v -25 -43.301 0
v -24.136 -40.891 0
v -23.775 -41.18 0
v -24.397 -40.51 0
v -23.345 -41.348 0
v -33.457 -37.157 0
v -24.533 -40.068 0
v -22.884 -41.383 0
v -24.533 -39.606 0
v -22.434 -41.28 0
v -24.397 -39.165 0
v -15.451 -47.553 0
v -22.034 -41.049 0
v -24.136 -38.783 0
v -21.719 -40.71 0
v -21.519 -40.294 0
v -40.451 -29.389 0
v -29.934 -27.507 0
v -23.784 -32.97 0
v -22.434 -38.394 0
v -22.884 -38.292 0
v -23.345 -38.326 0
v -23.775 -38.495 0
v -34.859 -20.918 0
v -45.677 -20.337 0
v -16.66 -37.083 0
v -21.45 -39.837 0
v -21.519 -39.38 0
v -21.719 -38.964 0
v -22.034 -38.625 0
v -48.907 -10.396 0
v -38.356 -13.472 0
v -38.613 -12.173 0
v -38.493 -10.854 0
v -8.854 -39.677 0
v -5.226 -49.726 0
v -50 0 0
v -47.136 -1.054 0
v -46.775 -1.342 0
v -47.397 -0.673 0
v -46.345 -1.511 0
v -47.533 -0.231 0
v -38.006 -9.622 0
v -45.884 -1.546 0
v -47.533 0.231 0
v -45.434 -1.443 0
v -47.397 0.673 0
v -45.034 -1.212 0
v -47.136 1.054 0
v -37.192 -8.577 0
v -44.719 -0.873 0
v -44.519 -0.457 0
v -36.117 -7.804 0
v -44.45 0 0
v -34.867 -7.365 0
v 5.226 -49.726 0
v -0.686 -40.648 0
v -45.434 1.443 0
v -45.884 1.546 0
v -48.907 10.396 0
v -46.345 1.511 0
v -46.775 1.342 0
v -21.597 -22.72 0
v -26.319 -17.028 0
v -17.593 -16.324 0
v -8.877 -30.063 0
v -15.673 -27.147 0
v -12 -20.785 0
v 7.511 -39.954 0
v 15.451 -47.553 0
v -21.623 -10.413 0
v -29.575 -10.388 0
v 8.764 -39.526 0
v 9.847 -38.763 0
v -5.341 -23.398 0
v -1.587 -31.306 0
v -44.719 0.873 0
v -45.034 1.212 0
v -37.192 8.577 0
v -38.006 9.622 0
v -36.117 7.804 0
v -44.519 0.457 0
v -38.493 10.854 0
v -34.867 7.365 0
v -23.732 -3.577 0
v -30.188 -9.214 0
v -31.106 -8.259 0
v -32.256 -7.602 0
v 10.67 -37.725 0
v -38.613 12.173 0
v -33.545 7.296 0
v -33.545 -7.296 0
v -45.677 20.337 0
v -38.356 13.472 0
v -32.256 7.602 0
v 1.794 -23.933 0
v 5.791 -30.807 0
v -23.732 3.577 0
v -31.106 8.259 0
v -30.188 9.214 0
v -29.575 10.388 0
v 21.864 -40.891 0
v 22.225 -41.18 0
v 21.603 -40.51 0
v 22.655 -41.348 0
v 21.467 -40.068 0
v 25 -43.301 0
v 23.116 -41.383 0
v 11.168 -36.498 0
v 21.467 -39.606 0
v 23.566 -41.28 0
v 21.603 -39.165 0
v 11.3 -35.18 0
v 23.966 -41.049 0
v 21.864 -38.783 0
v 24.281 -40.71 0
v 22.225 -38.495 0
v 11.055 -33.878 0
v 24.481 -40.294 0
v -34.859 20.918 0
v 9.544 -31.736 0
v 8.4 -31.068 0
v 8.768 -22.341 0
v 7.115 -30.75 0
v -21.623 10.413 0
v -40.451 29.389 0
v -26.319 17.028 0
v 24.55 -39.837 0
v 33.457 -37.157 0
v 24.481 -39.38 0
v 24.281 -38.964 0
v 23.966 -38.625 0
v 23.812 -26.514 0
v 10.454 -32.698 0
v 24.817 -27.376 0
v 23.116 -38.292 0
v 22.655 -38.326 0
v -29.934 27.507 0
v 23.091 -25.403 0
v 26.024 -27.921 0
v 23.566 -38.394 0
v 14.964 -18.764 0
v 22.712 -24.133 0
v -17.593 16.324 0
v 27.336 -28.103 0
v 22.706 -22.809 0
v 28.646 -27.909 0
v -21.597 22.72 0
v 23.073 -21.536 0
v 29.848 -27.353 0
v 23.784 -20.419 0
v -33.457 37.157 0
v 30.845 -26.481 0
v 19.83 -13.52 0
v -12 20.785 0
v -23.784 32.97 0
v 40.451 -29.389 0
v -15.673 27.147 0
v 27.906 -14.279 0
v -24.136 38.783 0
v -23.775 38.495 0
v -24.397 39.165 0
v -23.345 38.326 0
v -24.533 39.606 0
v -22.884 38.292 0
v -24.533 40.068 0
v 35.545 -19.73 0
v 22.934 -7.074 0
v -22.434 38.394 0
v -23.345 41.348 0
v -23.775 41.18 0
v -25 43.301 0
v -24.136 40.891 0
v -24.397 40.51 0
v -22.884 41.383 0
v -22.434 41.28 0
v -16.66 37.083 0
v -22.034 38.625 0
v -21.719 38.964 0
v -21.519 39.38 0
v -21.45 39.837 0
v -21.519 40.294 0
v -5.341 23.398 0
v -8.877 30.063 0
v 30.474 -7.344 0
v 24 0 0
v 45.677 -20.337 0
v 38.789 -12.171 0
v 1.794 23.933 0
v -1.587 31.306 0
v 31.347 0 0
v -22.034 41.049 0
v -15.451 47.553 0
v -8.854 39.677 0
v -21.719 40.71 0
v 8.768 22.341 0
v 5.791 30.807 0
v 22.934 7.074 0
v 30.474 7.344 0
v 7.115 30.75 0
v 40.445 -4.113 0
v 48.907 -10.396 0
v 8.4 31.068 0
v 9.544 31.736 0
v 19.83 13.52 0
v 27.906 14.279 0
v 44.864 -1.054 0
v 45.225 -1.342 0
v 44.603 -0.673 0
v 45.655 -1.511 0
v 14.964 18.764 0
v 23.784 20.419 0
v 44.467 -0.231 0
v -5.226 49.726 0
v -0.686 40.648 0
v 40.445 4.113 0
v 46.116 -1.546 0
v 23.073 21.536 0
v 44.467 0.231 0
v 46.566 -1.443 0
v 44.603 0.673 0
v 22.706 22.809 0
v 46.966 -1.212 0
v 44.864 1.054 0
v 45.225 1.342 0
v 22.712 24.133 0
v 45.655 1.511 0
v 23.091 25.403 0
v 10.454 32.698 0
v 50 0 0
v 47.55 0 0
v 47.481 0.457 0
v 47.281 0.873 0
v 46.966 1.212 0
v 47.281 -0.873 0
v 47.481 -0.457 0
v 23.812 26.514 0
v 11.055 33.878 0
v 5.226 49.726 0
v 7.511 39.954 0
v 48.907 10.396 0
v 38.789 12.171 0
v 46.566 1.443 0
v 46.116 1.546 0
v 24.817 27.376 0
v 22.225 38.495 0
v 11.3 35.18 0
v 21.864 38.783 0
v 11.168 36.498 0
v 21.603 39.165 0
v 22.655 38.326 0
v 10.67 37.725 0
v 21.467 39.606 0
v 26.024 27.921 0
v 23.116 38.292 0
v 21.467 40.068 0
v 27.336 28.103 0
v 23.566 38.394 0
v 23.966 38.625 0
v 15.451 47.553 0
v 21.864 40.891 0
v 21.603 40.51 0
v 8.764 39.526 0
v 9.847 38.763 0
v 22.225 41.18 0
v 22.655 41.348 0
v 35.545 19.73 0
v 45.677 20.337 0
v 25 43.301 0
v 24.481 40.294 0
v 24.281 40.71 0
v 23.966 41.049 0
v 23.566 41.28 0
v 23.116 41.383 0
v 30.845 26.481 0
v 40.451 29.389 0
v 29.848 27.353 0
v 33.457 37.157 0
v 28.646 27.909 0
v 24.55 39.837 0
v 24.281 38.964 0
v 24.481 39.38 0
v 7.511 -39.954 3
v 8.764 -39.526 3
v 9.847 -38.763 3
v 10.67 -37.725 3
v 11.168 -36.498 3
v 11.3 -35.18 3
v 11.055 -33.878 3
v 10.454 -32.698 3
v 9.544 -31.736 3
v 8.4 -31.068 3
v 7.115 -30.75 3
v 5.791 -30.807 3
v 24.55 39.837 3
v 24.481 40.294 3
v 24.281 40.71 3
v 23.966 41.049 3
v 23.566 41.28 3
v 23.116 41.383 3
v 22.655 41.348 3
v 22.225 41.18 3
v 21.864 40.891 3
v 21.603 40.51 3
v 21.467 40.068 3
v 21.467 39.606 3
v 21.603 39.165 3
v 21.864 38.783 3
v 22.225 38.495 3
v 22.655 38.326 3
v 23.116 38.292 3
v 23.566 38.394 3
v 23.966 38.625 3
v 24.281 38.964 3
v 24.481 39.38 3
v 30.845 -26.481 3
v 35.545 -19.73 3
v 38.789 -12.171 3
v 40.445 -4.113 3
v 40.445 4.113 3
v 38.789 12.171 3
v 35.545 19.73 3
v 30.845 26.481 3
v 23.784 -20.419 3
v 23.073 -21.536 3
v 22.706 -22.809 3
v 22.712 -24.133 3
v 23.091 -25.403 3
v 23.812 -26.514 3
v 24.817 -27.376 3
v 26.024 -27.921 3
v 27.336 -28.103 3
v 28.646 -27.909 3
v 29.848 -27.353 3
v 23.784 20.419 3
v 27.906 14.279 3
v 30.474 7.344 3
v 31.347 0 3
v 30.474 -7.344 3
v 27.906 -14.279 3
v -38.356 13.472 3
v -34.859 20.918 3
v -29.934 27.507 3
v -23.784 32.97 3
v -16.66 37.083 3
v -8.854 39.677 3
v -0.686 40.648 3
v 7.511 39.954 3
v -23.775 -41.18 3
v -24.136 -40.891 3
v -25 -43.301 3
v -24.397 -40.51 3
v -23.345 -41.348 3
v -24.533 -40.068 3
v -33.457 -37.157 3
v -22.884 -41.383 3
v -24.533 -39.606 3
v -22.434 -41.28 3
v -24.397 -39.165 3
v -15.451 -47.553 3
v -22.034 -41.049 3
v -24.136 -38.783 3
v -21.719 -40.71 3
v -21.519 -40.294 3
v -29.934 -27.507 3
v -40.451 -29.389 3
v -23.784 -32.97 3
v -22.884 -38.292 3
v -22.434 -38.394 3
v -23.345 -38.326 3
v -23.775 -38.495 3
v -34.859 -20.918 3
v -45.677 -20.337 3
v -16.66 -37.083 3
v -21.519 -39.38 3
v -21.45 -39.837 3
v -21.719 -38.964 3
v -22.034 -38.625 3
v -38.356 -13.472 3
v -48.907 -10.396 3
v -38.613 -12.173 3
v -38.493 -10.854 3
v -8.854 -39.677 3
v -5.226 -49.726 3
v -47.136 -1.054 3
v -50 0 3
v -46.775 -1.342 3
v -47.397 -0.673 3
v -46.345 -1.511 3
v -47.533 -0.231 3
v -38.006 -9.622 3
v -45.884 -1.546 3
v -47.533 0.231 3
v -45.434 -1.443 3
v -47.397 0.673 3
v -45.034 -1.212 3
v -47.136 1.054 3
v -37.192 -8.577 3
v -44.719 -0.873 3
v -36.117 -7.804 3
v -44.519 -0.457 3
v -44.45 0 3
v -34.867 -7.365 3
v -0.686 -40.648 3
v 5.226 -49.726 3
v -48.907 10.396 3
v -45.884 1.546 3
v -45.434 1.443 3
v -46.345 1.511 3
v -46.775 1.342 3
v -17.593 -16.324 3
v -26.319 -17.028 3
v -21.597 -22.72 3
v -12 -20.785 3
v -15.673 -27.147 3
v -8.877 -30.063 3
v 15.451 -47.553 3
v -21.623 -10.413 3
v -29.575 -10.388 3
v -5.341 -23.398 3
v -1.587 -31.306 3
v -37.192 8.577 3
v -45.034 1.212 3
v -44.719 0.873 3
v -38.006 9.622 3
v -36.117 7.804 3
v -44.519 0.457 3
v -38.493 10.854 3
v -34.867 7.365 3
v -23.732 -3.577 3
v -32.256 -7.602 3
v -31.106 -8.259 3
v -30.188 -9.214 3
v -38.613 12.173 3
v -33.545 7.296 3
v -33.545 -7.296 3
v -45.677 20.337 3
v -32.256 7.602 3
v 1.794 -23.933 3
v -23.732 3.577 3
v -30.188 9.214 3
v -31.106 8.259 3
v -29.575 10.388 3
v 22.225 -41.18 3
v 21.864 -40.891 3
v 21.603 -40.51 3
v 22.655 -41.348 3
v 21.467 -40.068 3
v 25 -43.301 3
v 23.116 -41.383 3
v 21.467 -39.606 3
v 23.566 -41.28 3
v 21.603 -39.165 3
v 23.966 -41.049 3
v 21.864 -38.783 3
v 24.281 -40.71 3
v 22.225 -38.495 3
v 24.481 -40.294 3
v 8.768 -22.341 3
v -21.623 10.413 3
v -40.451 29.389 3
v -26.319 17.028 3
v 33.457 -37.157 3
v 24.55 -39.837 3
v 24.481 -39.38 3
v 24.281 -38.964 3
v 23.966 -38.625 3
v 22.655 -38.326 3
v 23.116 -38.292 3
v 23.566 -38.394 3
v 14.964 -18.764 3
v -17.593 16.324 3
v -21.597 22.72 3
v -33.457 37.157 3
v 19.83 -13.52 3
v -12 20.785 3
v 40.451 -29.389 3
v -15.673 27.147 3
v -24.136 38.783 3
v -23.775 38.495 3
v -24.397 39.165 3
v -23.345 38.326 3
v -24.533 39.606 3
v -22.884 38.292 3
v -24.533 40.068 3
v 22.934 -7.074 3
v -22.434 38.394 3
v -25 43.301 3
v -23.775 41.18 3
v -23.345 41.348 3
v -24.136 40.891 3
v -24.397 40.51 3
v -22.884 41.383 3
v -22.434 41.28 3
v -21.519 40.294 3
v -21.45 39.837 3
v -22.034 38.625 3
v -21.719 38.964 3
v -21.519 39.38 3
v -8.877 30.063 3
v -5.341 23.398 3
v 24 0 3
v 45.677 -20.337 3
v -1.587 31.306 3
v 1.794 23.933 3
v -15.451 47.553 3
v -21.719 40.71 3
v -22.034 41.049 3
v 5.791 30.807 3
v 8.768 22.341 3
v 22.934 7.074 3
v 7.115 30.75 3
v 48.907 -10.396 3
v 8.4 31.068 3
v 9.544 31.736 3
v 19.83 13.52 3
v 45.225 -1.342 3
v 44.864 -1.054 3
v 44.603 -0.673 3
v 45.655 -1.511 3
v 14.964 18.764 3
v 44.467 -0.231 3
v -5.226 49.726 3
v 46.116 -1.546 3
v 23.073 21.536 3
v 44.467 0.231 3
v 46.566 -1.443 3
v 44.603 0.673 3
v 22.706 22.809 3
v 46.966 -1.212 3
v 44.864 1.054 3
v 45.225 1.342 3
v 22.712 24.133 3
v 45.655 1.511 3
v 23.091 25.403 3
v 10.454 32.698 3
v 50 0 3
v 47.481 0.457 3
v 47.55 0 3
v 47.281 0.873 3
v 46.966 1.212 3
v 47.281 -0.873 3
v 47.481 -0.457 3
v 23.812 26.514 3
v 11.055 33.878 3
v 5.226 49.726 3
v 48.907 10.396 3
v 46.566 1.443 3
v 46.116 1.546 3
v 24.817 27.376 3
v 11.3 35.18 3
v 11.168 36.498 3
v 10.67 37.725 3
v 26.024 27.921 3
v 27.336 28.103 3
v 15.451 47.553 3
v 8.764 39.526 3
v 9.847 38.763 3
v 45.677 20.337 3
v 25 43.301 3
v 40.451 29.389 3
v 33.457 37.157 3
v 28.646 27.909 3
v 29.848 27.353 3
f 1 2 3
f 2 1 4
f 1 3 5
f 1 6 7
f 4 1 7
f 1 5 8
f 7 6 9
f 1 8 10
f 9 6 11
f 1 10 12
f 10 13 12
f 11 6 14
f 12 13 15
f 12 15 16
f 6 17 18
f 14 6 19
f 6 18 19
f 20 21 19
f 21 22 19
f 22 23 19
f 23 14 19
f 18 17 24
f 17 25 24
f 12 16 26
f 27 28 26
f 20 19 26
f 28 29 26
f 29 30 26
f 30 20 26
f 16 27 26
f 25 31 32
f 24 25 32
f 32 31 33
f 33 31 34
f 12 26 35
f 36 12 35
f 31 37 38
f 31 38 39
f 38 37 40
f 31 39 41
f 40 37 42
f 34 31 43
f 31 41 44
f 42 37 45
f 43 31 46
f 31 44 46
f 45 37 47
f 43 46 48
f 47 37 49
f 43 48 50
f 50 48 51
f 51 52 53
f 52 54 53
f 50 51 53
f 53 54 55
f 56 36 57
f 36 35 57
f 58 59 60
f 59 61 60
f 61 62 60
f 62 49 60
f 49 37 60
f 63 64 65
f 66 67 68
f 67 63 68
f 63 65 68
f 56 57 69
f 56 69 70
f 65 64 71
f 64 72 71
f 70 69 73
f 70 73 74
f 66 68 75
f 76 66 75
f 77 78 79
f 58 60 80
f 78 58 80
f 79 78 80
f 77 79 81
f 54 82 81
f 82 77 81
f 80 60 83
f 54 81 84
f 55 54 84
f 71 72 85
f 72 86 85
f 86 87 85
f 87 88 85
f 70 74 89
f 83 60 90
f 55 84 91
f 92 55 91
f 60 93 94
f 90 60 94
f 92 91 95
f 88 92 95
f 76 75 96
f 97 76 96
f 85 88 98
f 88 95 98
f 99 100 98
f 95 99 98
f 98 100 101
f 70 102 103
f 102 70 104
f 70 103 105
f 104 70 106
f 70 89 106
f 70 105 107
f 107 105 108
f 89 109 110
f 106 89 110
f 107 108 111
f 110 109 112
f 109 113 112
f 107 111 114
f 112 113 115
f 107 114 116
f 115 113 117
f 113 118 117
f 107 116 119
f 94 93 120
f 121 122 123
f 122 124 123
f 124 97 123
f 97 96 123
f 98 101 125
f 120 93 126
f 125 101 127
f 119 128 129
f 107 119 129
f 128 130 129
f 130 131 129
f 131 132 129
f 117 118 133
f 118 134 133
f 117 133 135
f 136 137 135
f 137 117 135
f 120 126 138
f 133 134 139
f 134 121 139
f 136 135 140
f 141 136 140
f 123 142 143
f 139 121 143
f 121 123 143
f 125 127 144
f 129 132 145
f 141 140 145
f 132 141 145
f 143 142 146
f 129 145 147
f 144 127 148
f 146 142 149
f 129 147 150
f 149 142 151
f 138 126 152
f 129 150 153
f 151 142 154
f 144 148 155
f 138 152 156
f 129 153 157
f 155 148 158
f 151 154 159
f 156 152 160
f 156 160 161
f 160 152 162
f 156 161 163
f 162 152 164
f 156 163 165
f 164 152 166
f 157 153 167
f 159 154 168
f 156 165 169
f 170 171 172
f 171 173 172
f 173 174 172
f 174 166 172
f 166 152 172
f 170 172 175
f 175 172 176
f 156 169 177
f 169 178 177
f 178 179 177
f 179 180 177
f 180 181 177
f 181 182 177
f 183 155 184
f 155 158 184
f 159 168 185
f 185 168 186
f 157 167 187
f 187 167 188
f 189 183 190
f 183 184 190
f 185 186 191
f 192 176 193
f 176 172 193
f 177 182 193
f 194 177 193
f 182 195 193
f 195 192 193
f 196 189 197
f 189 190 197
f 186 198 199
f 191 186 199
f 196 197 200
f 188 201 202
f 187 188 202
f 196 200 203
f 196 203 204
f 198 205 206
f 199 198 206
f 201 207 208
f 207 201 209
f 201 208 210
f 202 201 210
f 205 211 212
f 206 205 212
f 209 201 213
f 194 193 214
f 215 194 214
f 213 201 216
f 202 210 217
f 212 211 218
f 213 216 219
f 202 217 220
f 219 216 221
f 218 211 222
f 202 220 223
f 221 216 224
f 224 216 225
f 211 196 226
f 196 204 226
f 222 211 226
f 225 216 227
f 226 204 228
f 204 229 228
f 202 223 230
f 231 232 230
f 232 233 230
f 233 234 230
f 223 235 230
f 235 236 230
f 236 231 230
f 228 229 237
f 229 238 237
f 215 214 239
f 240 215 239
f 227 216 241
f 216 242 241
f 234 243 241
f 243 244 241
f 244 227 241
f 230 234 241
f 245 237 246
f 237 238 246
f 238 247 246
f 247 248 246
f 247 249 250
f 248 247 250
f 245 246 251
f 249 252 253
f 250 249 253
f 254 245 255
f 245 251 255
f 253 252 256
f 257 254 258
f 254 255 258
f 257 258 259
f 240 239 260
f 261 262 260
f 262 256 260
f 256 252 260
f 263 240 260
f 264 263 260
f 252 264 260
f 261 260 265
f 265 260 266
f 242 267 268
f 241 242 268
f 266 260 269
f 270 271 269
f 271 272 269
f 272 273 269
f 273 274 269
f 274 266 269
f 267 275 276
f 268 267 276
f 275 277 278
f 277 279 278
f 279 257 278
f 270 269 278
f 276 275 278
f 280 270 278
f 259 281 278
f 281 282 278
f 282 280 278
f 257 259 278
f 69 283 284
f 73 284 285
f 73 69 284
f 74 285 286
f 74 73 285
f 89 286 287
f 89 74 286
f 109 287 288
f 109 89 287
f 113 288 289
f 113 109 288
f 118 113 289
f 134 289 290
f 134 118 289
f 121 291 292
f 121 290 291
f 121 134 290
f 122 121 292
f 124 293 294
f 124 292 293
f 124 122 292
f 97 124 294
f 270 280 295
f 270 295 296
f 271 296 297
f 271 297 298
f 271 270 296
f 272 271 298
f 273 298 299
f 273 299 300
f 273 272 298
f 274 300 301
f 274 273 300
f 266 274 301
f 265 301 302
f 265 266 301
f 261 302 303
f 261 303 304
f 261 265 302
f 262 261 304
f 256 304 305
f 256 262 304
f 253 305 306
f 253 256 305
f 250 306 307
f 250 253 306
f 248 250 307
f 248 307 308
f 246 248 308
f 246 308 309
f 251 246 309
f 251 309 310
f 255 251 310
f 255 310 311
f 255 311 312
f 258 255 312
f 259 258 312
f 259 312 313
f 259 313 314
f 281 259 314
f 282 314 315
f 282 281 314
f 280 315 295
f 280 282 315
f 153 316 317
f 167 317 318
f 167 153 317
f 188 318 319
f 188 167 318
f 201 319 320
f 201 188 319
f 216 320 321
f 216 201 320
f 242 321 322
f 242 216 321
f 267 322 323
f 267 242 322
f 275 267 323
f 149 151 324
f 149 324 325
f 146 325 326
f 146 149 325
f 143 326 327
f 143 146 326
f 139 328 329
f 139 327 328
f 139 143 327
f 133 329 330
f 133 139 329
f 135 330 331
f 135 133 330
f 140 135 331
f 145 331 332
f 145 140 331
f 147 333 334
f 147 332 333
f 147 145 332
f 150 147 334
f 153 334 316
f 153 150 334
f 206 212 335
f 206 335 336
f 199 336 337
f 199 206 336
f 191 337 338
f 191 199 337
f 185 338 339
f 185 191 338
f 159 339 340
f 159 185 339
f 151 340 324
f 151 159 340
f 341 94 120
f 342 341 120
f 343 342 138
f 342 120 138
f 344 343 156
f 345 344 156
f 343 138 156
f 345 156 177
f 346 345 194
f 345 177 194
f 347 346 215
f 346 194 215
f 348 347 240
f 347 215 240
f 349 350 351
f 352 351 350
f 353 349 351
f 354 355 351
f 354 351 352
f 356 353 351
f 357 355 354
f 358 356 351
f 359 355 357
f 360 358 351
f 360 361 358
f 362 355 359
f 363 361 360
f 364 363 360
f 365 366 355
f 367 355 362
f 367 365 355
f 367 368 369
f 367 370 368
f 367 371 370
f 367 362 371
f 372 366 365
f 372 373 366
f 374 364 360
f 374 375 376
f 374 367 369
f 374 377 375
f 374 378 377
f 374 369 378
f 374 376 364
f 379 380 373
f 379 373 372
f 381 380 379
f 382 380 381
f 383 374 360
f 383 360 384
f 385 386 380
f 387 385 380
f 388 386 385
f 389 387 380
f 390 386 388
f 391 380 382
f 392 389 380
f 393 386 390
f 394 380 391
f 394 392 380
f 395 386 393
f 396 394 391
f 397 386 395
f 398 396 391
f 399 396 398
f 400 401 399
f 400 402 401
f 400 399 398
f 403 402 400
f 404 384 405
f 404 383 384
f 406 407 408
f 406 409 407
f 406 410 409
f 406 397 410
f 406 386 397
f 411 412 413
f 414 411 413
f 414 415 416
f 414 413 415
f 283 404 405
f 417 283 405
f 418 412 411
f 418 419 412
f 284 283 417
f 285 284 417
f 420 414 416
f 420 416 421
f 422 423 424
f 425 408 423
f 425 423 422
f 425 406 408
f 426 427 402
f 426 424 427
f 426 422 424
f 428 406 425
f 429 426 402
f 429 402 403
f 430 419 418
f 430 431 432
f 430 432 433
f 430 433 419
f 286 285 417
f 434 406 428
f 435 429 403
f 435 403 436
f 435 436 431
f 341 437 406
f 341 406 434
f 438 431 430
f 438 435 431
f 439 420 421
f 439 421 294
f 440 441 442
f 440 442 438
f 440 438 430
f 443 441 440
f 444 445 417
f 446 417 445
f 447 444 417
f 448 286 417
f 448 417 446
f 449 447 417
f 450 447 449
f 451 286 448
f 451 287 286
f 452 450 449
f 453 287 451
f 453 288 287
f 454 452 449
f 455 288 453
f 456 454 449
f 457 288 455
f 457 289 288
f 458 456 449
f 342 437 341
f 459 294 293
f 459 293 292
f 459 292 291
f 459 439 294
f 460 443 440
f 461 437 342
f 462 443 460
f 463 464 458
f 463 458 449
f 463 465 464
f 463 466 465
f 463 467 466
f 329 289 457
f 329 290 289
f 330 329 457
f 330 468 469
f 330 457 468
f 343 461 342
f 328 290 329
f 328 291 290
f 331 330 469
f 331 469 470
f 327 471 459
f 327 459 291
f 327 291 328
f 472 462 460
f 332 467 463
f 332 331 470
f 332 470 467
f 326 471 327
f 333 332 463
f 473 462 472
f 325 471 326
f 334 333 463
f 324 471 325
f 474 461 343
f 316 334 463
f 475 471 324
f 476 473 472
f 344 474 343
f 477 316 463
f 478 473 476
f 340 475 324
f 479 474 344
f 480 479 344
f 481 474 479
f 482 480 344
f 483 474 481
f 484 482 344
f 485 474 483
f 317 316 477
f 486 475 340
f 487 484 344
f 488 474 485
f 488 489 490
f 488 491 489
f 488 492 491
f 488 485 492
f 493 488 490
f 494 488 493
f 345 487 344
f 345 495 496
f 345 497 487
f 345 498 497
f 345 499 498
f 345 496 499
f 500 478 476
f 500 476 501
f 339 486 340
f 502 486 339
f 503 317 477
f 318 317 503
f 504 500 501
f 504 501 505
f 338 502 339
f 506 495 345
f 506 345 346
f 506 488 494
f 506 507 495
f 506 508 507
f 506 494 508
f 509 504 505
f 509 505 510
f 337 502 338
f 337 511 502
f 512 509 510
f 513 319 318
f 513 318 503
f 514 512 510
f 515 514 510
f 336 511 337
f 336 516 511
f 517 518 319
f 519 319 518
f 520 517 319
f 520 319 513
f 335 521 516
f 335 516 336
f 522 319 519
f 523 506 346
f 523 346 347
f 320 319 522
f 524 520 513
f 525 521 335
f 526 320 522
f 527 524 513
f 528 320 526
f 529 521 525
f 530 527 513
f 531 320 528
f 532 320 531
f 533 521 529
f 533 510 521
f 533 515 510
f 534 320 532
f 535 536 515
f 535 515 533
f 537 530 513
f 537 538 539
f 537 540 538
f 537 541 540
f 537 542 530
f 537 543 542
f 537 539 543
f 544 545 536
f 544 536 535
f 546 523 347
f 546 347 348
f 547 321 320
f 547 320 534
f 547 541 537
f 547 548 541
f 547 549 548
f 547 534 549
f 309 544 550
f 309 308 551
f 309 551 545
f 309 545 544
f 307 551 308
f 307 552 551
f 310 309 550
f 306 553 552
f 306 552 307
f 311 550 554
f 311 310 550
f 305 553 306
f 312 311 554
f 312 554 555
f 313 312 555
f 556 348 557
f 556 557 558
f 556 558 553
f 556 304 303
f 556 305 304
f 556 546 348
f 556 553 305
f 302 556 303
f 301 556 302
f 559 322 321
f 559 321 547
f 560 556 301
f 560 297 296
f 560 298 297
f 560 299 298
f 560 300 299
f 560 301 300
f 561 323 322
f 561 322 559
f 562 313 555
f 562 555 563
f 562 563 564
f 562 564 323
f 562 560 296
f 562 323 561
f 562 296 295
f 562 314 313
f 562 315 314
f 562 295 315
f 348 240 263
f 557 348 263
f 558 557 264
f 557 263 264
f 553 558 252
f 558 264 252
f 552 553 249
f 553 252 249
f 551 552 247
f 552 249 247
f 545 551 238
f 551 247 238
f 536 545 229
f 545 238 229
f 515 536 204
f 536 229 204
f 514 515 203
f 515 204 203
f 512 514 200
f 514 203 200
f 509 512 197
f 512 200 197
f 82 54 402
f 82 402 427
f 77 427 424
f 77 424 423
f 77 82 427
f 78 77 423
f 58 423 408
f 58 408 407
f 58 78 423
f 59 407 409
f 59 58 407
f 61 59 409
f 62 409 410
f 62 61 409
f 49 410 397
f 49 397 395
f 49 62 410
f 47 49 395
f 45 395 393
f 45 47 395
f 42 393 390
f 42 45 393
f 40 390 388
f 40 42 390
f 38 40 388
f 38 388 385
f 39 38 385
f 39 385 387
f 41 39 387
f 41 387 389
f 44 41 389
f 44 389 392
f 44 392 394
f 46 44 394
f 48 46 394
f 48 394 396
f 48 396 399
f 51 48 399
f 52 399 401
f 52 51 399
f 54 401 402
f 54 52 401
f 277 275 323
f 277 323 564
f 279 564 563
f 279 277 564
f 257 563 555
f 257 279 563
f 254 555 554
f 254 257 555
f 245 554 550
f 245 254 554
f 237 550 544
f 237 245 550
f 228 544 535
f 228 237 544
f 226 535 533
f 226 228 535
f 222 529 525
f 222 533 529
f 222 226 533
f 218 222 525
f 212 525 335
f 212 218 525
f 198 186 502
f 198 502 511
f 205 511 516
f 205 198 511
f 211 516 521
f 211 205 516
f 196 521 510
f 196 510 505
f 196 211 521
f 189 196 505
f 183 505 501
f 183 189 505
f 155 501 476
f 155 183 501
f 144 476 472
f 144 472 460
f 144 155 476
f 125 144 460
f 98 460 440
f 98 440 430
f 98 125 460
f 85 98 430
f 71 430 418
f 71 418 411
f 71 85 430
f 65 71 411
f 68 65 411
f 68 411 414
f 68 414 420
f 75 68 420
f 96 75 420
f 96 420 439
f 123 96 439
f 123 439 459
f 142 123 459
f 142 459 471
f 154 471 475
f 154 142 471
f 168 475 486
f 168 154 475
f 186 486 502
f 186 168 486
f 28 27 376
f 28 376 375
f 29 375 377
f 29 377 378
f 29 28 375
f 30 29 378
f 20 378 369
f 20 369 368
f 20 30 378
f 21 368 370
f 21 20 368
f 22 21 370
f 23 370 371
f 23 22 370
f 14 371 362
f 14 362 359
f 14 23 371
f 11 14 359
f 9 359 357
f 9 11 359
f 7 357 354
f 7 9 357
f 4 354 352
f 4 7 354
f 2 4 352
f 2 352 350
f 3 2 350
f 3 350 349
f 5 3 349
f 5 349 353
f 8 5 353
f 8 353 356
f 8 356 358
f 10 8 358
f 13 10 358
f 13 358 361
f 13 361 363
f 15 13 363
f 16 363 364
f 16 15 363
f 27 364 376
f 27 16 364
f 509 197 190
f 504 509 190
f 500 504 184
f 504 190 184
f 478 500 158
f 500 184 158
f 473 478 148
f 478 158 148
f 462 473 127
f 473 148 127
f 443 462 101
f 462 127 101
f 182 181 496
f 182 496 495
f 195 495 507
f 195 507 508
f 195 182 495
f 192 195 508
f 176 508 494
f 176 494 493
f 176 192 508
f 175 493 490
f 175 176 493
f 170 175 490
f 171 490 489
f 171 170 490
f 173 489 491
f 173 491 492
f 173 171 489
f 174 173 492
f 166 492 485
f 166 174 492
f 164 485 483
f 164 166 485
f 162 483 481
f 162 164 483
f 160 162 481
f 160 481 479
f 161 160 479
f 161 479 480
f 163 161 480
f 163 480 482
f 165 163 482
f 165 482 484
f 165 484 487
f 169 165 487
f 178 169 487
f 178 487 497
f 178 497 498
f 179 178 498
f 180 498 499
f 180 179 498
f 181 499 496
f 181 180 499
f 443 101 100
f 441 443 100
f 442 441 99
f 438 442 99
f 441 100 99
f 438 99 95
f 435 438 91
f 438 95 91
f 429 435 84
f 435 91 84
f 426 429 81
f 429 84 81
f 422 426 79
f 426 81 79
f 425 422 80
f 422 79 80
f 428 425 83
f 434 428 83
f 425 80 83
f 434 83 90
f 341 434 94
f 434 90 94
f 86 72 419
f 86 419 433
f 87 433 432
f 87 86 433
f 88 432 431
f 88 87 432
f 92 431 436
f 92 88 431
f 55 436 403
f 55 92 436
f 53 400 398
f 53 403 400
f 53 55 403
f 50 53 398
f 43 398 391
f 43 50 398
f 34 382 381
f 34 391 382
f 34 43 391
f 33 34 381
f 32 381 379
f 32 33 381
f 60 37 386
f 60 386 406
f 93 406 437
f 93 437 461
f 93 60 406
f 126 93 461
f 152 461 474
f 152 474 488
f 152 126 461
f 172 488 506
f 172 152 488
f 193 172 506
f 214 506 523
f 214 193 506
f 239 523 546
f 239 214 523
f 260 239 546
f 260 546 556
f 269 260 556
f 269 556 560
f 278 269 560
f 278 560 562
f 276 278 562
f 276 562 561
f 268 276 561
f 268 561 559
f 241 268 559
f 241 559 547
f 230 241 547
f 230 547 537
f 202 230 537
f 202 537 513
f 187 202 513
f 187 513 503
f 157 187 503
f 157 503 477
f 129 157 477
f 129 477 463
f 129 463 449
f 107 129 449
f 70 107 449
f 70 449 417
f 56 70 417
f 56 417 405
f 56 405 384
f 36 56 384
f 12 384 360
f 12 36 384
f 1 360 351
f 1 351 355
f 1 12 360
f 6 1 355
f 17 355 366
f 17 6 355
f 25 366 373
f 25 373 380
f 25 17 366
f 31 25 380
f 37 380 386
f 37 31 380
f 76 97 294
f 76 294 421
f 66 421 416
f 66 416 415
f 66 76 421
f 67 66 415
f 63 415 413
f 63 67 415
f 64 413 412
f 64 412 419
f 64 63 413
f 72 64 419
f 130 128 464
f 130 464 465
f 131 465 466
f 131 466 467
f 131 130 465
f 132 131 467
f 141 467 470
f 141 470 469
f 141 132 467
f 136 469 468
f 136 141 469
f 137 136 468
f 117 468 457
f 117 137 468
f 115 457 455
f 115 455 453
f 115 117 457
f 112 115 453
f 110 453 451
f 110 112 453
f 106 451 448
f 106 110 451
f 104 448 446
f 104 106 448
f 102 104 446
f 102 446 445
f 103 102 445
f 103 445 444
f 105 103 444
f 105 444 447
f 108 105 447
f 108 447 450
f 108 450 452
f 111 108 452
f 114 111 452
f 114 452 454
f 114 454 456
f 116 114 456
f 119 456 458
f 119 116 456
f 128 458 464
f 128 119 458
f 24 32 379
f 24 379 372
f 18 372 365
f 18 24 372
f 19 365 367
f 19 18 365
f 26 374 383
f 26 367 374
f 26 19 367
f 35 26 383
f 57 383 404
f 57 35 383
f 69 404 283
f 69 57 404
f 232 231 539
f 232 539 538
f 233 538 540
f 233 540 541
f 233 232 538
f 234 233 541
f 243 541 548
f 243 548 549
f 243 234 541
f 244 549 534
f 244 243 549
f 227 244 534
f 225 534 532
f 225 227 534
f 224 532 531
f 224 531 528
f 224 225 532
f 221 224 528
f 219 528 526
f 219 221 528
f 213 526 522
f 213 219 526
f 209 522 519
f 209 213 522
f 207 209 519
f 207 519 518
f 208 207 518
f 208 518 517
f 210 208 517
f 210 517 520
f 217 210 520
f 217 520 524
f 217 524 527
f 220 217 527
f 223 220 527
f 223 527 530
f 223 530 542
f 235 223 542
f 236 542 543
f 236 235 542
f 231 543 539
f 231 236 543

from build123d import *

# Parameters (mm, degrees)
SKETCH_1_R          = 52
SKETCH_1_R_2        = 1.55
SKETCH_1_R_3        = 40
EXTRUDE_1_DEPTH     = 3
EXTRUDE_START       = -3
SKETCH_2_R          = 40
SKETCH_2_R_2        = 24
EXTRUDE_2_DEPTH     = 3
CUT_EXTRUDE_1_DEPTH = 10
SKETCH_5_R          = 63.024090269
SKETCH_5_R_2        = 50
CUT_EXTRUDE_2_DEPTH = 10


with BuildPart() as part:
    # 草图1 → 凸台-拉伸1 (new body)
    with BuildSketch(Plane.XY):
        Circle(SKETCH_1_R)
        with Locations((46, 0)):
            Circle(SKETCH_1_R_2, mode=Mode.SUBTRACT)
        with Locations((23, -39.837168574)):
            Circle(SKETCH_1_R_2, mode=Mode.SUBTRACT)
        with Locations((-23, -39.837168574)):
            Circle(SKETCH_1_R_2, mode=Mode.SUBTRACT)
        with Locations((-46, 0)):
            Circle(SKETCH_1_R_2, mode=Mode.SUBTRACT)
        with Locations((-23, 39.837168574)):
            Circle(SKETCH_1_R_2, mode=Mode.SUBTRACT)
        with Locations((23, 39.837168574)):
            Circle(SKETCH_1_R_2, mode=Mode.SUBTRACT)
        Circle(SKETCH_1_R_3, mode=Mode.SUBTRACT)
    extrude(amount=EXTRUDE_1_DEPTH)

    # 草图2 → 凸台-拉伸2 (add)
    with BuildSketch(Plane.XY.offset(3).offset(EXTRUDE_START)):
        Circle(SKETCH_2_R)
        Circle(SKETCH_2_R_2, mode=Mode.SUBTRACT)
    extrude(amount=EXTRUDE_2_DEPTH)

    # 草图4 → 切除-拉伸1 (cut)
    with BuildSketch(Plane(origin=(0, 0, 0), x_dir=(-1, 0, 0), z_dir=(0, 0, -1))):
        with BuildLine():
            ThreePointArc((38.356187762, 13.472205401), (20.326690938, 35.206861455), (-7.510821758, 39.953535695))
            ThreePointArc((-7.510821758, 39.953535695), (-11.224371039, 34.520536752), (-5.791372097, 30.806987471))
            ThreePointArc((-5.791372097, 30.806987471), (15.673309062, 27.146967618), (29.575319812, 10.388018377))
            ThreePointArc((29.575319812, 10.388018377), (35.507847299, 7.539677914), (38.356187762, 13.472205401))
        make_face()
        with BuildLine():
            ThreePointArc((-5.791372097, -30.806987471), (15.673309062, -27.146967618), (29.575319812, -10.388018377))
            ThreePointArc((29.575319812, -10.388018377), (35.507847299, -7.539677914), (38.356187762, -13.472205401))
            ThreePointArc((38.356187762, -13.472205401), (20.326690938, -35.206861455), (-7.510821758, -39.953535695))
            ThreePointArc((-7.510821758, -39.953535695), (-11.224371039, -34.520536752), (-5.791372097, -30.806987471))
        make_face()
        with BuildLine():
            ThreePointArc((-23.783947715, 20.418969094), (-31.346618124, 0), (-23.783947715, -20.418969094))
            ThreePointArc((-23.783947715, -20.418969094), (-24.28347626, -26.980858838), (-30.845366003, -26.481330293))
            ThreePointArc((-30.845366003, -26.481330293), (-40.653381876, 0), (-30.845366003, 26.481330293))
            ThreePointArc((-30.845366003, 26.481330293), (-24.28347626, 26.980858838), (-23.783947715, 20.418969094))
        make_face()
    extrude(amount=-CUT_EXTRUDE_1_DEPTH, mode=Mode.SUBTRACT)

    # 草图5 → 切除-拉伸2 (cut)
    with BuildSketch(Plane(origin=(0, 0, 0), x_dir=(-1, 0, 0), z_dir=(0, 0, -1))):
        Circle(SKETCH_5_R)
        Circle(SKETCH_5_R_2, mode=Mode.SUBTRACT)
    extrude(amount=-CUT_EXTRUDE_2_DEPTH, mode=Mode.SUBTRACT)


solid = part.part
